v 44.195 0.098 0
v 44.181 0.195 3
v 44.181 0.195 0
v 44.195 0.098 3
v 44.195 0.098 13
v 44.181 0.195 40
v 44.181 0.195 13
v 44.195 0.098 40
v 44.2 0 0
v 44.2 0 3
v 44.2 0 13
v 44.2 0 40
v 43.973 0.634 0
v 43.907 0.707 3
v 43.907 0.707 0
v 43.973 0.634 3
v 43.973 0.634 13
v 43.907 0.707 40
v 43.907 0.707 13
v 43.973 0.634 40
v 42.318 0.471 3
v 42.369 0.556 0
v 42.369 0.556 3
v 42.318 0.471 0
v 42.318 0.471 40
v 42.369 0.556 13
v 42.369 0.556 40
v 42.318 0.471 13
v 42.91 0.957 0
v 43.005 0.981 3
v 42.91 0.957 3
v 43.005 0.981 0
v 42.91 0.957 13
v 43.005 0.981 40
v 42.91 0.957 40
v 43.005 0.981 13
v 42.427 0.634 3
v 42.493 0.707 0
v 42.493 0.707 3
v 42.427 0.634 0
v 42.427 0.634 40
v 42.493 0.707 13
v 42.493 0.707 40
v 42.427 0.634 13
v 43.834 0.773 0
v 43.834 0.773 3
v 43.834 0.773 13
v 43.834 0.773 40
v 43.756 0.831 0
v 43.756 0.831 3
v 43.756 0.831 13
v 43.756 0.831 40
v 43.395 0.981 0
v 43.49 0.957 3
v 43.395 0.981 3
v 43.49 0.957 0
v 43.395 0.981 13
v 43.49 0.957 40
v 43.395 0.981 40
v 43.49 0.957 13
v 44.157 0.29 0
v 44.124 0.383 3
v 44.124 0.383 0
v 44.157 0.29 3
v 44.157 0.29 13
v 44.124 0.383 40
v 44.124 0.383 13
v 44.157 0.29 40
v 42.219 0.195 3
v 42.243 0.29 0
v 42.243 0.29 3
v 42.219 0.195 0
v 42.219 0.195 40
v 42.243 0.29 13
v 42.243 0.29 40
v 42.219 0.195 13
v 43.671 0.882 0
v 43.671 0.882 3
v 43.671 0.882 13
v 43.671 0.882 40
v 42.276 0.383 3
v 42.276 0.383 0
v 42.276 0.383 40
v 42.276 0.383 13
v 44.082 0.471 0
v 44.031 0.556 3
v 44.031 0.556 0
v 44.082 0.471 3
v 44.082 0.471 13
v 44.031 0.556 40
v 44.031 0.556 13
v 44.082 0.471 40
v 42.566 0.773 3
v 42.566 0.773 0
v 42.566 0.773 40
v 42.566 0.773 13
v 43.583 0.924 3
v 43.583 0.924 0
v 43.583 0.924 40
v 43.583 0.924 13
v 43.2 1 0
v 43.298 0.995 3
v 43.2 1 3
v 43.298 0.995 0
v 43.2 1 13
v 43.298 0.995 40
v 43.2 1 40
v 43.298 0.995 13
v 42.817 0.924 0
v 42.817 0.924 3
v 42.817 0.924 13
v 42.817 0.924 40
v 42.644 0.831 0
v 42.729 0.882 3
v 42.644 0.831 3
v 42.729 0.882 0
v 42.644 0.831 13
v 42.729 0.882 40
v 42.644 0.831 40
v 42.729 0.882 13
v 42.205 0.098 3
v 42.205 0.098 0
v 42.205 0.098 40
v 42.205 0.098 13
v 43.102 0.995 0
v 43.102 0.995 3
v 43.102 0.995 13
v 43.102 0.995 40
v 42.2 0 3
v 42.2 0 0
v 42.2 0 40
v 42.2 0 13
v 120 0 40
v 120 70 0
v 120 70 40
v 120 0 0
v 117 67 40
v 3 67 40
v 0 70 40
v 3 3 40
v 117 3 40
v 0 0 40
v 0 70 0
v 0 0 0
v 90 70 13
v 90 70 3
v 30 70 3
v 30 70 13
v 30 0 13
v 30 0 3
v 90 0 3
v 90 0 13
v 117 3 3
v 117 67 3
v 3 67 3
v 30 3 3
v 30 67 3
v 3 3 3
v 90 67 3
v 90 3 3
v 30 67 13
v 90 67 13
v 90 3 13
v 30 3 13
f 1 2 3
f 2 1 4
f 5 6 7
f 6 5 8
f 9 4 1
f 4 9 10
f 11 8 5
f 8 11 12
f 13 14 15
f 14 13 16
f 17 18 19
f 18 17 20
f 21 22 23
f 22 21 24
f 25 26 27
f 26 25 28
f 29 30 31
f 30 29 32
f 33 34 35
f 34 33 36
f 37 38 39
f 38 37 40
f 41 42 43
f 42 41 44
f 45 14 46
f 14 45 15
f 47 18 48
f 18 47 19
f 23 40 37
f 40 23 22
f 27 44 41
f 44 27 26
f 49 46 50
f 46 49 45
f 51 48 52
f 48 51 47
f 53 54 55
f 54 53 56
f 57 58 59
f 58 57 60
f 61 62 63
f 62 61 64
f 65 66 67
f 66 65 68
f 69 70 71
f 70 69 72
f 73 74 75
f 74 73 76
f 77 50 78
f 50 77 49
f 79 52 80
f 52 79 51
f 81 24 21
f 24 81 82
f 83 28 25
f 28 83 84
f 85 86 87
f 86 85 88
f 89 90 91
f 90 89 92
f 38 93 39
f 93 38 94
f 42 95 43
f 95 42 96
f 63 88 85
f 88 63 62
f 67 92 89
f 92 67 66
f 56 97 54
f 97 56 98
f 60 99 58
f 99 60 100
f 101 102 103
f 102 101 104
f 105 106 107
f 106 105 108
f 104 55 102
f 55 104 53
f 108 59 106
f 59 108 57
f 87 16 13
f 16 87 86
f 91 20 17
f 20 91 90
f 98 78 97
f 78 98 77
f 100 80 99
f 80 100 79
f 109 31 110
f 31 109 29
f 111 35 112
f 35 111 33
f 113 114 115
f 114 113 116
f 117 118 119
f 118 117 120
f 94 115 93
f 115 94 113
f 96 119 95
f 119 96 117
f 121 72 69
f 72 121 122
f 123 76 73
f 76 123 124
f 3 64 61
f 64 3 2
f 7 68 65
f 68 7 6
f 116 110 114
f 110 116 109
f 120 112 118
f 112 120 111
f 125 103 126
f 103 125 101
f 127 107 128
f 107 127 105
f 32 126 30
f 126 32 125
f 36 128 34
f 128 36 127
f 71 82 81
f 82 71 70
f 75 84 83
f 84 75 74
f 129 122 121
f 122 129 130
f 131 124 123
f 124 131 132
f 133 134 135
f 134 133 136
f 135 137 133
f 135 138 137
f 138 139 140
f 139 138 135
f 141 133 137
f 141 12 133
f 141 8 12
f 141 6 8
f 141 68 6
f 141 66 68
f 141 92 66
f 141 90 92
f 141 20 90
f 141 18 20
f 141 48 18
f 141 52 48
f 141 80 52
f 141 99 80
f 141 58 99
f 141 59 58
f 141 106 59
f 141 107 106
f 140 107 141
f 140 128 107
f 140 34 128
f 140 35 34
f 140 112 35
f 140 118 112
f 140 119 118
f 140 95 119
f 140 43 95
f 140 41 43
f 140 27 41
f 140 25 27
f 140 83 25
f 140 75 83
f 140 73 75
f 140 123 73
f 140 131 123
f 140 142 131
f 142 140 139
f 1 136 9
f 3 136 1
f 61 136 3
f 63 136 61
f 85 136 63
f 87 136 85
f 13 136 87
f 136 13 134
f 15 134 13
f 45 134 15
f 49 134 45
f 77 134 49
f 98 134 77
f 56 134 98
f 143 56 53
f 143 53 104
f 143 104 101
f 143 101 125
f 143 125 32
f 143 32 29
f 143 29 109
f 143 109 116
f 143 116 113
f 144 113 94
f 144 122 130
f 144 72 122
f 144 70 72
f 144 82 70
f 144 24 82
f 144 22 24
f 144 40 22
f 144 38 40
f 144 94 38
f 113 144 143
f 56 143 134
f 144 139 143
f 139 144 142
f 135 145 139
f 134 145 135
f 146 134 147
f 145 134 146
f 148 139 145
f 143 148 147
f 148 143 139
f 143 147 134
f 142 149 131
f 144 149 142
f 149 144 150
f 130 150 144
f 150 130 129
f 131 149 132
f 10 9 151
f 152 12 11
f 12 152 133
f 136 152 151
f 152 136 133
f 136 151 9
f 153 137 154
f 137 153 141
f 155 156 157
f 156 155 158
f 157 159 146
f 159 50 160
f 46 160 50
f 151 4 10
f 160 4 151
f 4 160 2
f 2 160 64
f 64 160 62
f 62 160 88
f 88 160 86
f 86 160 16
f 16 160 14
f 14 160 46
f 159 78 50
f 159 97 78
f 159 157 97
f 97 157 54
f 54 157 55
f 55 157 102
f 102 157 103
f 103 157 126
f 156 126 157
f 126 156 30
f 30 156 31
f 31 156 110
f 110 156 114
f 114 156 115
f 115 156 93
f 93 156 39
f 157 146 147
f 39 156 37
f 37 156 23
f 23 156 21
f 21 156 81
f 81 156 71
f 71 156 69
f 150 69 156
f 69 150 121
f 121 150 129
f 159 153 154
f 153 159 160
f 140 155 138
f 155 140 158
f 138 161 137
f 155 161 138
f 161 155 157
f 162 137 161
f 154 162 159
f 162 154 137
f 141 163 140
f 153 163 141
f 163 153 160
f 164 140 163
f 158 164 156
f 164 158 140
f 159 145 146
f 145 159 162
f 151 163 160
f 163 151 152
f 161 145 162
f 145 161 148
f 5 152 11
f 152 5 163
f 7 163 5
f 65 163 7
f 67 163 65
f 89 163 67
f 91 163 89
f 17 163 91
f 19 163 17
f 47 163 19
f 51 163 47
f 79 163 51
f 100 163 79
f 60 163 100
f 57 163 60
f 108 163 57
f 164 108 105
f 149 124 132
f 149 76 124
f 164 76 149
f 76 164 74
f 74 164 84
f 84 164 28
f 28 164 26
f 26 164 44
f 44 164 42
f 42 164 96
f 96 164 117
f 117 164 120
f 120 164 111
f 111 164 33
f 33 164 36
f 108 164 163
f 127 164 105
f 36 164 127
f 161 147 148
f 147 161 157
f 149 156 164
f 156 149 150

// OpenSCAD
// Buffer tank for a mini horizontal gel-electrophoresis box. Open-top rectangular tank with a
// solid raised platform in the middle that divides the bottom into two buffer chambers. Each end
// wall has a horizontal 2 mm hole for an electrode wire. NOVEL general part.
//

L     = 120;
W     = 70;
H     = 40;
wall  = 3;
floor = 3;
plat  = 60;
plat_h = 10;

$fn = 64;

inner_w = W - 2 * wall;
inner_h = H - floor;

difference() {
    cube([L, W, H]);
    translate([wall, wall, floor]) cube([L - 2 * wall, W - 2 * wall, H - floor]);     // hollow, open top
    translate([L / 2 - plat / 2, 0, floor]) cube([plat, W, plat_h]);                 // central platform (full width)
    for (x = [-L * 0.36, L * 0.36])
        translate([x, 0, -1]) cylinder(h = H + 2, d = 2);                            // electrode holes through end walls
}
